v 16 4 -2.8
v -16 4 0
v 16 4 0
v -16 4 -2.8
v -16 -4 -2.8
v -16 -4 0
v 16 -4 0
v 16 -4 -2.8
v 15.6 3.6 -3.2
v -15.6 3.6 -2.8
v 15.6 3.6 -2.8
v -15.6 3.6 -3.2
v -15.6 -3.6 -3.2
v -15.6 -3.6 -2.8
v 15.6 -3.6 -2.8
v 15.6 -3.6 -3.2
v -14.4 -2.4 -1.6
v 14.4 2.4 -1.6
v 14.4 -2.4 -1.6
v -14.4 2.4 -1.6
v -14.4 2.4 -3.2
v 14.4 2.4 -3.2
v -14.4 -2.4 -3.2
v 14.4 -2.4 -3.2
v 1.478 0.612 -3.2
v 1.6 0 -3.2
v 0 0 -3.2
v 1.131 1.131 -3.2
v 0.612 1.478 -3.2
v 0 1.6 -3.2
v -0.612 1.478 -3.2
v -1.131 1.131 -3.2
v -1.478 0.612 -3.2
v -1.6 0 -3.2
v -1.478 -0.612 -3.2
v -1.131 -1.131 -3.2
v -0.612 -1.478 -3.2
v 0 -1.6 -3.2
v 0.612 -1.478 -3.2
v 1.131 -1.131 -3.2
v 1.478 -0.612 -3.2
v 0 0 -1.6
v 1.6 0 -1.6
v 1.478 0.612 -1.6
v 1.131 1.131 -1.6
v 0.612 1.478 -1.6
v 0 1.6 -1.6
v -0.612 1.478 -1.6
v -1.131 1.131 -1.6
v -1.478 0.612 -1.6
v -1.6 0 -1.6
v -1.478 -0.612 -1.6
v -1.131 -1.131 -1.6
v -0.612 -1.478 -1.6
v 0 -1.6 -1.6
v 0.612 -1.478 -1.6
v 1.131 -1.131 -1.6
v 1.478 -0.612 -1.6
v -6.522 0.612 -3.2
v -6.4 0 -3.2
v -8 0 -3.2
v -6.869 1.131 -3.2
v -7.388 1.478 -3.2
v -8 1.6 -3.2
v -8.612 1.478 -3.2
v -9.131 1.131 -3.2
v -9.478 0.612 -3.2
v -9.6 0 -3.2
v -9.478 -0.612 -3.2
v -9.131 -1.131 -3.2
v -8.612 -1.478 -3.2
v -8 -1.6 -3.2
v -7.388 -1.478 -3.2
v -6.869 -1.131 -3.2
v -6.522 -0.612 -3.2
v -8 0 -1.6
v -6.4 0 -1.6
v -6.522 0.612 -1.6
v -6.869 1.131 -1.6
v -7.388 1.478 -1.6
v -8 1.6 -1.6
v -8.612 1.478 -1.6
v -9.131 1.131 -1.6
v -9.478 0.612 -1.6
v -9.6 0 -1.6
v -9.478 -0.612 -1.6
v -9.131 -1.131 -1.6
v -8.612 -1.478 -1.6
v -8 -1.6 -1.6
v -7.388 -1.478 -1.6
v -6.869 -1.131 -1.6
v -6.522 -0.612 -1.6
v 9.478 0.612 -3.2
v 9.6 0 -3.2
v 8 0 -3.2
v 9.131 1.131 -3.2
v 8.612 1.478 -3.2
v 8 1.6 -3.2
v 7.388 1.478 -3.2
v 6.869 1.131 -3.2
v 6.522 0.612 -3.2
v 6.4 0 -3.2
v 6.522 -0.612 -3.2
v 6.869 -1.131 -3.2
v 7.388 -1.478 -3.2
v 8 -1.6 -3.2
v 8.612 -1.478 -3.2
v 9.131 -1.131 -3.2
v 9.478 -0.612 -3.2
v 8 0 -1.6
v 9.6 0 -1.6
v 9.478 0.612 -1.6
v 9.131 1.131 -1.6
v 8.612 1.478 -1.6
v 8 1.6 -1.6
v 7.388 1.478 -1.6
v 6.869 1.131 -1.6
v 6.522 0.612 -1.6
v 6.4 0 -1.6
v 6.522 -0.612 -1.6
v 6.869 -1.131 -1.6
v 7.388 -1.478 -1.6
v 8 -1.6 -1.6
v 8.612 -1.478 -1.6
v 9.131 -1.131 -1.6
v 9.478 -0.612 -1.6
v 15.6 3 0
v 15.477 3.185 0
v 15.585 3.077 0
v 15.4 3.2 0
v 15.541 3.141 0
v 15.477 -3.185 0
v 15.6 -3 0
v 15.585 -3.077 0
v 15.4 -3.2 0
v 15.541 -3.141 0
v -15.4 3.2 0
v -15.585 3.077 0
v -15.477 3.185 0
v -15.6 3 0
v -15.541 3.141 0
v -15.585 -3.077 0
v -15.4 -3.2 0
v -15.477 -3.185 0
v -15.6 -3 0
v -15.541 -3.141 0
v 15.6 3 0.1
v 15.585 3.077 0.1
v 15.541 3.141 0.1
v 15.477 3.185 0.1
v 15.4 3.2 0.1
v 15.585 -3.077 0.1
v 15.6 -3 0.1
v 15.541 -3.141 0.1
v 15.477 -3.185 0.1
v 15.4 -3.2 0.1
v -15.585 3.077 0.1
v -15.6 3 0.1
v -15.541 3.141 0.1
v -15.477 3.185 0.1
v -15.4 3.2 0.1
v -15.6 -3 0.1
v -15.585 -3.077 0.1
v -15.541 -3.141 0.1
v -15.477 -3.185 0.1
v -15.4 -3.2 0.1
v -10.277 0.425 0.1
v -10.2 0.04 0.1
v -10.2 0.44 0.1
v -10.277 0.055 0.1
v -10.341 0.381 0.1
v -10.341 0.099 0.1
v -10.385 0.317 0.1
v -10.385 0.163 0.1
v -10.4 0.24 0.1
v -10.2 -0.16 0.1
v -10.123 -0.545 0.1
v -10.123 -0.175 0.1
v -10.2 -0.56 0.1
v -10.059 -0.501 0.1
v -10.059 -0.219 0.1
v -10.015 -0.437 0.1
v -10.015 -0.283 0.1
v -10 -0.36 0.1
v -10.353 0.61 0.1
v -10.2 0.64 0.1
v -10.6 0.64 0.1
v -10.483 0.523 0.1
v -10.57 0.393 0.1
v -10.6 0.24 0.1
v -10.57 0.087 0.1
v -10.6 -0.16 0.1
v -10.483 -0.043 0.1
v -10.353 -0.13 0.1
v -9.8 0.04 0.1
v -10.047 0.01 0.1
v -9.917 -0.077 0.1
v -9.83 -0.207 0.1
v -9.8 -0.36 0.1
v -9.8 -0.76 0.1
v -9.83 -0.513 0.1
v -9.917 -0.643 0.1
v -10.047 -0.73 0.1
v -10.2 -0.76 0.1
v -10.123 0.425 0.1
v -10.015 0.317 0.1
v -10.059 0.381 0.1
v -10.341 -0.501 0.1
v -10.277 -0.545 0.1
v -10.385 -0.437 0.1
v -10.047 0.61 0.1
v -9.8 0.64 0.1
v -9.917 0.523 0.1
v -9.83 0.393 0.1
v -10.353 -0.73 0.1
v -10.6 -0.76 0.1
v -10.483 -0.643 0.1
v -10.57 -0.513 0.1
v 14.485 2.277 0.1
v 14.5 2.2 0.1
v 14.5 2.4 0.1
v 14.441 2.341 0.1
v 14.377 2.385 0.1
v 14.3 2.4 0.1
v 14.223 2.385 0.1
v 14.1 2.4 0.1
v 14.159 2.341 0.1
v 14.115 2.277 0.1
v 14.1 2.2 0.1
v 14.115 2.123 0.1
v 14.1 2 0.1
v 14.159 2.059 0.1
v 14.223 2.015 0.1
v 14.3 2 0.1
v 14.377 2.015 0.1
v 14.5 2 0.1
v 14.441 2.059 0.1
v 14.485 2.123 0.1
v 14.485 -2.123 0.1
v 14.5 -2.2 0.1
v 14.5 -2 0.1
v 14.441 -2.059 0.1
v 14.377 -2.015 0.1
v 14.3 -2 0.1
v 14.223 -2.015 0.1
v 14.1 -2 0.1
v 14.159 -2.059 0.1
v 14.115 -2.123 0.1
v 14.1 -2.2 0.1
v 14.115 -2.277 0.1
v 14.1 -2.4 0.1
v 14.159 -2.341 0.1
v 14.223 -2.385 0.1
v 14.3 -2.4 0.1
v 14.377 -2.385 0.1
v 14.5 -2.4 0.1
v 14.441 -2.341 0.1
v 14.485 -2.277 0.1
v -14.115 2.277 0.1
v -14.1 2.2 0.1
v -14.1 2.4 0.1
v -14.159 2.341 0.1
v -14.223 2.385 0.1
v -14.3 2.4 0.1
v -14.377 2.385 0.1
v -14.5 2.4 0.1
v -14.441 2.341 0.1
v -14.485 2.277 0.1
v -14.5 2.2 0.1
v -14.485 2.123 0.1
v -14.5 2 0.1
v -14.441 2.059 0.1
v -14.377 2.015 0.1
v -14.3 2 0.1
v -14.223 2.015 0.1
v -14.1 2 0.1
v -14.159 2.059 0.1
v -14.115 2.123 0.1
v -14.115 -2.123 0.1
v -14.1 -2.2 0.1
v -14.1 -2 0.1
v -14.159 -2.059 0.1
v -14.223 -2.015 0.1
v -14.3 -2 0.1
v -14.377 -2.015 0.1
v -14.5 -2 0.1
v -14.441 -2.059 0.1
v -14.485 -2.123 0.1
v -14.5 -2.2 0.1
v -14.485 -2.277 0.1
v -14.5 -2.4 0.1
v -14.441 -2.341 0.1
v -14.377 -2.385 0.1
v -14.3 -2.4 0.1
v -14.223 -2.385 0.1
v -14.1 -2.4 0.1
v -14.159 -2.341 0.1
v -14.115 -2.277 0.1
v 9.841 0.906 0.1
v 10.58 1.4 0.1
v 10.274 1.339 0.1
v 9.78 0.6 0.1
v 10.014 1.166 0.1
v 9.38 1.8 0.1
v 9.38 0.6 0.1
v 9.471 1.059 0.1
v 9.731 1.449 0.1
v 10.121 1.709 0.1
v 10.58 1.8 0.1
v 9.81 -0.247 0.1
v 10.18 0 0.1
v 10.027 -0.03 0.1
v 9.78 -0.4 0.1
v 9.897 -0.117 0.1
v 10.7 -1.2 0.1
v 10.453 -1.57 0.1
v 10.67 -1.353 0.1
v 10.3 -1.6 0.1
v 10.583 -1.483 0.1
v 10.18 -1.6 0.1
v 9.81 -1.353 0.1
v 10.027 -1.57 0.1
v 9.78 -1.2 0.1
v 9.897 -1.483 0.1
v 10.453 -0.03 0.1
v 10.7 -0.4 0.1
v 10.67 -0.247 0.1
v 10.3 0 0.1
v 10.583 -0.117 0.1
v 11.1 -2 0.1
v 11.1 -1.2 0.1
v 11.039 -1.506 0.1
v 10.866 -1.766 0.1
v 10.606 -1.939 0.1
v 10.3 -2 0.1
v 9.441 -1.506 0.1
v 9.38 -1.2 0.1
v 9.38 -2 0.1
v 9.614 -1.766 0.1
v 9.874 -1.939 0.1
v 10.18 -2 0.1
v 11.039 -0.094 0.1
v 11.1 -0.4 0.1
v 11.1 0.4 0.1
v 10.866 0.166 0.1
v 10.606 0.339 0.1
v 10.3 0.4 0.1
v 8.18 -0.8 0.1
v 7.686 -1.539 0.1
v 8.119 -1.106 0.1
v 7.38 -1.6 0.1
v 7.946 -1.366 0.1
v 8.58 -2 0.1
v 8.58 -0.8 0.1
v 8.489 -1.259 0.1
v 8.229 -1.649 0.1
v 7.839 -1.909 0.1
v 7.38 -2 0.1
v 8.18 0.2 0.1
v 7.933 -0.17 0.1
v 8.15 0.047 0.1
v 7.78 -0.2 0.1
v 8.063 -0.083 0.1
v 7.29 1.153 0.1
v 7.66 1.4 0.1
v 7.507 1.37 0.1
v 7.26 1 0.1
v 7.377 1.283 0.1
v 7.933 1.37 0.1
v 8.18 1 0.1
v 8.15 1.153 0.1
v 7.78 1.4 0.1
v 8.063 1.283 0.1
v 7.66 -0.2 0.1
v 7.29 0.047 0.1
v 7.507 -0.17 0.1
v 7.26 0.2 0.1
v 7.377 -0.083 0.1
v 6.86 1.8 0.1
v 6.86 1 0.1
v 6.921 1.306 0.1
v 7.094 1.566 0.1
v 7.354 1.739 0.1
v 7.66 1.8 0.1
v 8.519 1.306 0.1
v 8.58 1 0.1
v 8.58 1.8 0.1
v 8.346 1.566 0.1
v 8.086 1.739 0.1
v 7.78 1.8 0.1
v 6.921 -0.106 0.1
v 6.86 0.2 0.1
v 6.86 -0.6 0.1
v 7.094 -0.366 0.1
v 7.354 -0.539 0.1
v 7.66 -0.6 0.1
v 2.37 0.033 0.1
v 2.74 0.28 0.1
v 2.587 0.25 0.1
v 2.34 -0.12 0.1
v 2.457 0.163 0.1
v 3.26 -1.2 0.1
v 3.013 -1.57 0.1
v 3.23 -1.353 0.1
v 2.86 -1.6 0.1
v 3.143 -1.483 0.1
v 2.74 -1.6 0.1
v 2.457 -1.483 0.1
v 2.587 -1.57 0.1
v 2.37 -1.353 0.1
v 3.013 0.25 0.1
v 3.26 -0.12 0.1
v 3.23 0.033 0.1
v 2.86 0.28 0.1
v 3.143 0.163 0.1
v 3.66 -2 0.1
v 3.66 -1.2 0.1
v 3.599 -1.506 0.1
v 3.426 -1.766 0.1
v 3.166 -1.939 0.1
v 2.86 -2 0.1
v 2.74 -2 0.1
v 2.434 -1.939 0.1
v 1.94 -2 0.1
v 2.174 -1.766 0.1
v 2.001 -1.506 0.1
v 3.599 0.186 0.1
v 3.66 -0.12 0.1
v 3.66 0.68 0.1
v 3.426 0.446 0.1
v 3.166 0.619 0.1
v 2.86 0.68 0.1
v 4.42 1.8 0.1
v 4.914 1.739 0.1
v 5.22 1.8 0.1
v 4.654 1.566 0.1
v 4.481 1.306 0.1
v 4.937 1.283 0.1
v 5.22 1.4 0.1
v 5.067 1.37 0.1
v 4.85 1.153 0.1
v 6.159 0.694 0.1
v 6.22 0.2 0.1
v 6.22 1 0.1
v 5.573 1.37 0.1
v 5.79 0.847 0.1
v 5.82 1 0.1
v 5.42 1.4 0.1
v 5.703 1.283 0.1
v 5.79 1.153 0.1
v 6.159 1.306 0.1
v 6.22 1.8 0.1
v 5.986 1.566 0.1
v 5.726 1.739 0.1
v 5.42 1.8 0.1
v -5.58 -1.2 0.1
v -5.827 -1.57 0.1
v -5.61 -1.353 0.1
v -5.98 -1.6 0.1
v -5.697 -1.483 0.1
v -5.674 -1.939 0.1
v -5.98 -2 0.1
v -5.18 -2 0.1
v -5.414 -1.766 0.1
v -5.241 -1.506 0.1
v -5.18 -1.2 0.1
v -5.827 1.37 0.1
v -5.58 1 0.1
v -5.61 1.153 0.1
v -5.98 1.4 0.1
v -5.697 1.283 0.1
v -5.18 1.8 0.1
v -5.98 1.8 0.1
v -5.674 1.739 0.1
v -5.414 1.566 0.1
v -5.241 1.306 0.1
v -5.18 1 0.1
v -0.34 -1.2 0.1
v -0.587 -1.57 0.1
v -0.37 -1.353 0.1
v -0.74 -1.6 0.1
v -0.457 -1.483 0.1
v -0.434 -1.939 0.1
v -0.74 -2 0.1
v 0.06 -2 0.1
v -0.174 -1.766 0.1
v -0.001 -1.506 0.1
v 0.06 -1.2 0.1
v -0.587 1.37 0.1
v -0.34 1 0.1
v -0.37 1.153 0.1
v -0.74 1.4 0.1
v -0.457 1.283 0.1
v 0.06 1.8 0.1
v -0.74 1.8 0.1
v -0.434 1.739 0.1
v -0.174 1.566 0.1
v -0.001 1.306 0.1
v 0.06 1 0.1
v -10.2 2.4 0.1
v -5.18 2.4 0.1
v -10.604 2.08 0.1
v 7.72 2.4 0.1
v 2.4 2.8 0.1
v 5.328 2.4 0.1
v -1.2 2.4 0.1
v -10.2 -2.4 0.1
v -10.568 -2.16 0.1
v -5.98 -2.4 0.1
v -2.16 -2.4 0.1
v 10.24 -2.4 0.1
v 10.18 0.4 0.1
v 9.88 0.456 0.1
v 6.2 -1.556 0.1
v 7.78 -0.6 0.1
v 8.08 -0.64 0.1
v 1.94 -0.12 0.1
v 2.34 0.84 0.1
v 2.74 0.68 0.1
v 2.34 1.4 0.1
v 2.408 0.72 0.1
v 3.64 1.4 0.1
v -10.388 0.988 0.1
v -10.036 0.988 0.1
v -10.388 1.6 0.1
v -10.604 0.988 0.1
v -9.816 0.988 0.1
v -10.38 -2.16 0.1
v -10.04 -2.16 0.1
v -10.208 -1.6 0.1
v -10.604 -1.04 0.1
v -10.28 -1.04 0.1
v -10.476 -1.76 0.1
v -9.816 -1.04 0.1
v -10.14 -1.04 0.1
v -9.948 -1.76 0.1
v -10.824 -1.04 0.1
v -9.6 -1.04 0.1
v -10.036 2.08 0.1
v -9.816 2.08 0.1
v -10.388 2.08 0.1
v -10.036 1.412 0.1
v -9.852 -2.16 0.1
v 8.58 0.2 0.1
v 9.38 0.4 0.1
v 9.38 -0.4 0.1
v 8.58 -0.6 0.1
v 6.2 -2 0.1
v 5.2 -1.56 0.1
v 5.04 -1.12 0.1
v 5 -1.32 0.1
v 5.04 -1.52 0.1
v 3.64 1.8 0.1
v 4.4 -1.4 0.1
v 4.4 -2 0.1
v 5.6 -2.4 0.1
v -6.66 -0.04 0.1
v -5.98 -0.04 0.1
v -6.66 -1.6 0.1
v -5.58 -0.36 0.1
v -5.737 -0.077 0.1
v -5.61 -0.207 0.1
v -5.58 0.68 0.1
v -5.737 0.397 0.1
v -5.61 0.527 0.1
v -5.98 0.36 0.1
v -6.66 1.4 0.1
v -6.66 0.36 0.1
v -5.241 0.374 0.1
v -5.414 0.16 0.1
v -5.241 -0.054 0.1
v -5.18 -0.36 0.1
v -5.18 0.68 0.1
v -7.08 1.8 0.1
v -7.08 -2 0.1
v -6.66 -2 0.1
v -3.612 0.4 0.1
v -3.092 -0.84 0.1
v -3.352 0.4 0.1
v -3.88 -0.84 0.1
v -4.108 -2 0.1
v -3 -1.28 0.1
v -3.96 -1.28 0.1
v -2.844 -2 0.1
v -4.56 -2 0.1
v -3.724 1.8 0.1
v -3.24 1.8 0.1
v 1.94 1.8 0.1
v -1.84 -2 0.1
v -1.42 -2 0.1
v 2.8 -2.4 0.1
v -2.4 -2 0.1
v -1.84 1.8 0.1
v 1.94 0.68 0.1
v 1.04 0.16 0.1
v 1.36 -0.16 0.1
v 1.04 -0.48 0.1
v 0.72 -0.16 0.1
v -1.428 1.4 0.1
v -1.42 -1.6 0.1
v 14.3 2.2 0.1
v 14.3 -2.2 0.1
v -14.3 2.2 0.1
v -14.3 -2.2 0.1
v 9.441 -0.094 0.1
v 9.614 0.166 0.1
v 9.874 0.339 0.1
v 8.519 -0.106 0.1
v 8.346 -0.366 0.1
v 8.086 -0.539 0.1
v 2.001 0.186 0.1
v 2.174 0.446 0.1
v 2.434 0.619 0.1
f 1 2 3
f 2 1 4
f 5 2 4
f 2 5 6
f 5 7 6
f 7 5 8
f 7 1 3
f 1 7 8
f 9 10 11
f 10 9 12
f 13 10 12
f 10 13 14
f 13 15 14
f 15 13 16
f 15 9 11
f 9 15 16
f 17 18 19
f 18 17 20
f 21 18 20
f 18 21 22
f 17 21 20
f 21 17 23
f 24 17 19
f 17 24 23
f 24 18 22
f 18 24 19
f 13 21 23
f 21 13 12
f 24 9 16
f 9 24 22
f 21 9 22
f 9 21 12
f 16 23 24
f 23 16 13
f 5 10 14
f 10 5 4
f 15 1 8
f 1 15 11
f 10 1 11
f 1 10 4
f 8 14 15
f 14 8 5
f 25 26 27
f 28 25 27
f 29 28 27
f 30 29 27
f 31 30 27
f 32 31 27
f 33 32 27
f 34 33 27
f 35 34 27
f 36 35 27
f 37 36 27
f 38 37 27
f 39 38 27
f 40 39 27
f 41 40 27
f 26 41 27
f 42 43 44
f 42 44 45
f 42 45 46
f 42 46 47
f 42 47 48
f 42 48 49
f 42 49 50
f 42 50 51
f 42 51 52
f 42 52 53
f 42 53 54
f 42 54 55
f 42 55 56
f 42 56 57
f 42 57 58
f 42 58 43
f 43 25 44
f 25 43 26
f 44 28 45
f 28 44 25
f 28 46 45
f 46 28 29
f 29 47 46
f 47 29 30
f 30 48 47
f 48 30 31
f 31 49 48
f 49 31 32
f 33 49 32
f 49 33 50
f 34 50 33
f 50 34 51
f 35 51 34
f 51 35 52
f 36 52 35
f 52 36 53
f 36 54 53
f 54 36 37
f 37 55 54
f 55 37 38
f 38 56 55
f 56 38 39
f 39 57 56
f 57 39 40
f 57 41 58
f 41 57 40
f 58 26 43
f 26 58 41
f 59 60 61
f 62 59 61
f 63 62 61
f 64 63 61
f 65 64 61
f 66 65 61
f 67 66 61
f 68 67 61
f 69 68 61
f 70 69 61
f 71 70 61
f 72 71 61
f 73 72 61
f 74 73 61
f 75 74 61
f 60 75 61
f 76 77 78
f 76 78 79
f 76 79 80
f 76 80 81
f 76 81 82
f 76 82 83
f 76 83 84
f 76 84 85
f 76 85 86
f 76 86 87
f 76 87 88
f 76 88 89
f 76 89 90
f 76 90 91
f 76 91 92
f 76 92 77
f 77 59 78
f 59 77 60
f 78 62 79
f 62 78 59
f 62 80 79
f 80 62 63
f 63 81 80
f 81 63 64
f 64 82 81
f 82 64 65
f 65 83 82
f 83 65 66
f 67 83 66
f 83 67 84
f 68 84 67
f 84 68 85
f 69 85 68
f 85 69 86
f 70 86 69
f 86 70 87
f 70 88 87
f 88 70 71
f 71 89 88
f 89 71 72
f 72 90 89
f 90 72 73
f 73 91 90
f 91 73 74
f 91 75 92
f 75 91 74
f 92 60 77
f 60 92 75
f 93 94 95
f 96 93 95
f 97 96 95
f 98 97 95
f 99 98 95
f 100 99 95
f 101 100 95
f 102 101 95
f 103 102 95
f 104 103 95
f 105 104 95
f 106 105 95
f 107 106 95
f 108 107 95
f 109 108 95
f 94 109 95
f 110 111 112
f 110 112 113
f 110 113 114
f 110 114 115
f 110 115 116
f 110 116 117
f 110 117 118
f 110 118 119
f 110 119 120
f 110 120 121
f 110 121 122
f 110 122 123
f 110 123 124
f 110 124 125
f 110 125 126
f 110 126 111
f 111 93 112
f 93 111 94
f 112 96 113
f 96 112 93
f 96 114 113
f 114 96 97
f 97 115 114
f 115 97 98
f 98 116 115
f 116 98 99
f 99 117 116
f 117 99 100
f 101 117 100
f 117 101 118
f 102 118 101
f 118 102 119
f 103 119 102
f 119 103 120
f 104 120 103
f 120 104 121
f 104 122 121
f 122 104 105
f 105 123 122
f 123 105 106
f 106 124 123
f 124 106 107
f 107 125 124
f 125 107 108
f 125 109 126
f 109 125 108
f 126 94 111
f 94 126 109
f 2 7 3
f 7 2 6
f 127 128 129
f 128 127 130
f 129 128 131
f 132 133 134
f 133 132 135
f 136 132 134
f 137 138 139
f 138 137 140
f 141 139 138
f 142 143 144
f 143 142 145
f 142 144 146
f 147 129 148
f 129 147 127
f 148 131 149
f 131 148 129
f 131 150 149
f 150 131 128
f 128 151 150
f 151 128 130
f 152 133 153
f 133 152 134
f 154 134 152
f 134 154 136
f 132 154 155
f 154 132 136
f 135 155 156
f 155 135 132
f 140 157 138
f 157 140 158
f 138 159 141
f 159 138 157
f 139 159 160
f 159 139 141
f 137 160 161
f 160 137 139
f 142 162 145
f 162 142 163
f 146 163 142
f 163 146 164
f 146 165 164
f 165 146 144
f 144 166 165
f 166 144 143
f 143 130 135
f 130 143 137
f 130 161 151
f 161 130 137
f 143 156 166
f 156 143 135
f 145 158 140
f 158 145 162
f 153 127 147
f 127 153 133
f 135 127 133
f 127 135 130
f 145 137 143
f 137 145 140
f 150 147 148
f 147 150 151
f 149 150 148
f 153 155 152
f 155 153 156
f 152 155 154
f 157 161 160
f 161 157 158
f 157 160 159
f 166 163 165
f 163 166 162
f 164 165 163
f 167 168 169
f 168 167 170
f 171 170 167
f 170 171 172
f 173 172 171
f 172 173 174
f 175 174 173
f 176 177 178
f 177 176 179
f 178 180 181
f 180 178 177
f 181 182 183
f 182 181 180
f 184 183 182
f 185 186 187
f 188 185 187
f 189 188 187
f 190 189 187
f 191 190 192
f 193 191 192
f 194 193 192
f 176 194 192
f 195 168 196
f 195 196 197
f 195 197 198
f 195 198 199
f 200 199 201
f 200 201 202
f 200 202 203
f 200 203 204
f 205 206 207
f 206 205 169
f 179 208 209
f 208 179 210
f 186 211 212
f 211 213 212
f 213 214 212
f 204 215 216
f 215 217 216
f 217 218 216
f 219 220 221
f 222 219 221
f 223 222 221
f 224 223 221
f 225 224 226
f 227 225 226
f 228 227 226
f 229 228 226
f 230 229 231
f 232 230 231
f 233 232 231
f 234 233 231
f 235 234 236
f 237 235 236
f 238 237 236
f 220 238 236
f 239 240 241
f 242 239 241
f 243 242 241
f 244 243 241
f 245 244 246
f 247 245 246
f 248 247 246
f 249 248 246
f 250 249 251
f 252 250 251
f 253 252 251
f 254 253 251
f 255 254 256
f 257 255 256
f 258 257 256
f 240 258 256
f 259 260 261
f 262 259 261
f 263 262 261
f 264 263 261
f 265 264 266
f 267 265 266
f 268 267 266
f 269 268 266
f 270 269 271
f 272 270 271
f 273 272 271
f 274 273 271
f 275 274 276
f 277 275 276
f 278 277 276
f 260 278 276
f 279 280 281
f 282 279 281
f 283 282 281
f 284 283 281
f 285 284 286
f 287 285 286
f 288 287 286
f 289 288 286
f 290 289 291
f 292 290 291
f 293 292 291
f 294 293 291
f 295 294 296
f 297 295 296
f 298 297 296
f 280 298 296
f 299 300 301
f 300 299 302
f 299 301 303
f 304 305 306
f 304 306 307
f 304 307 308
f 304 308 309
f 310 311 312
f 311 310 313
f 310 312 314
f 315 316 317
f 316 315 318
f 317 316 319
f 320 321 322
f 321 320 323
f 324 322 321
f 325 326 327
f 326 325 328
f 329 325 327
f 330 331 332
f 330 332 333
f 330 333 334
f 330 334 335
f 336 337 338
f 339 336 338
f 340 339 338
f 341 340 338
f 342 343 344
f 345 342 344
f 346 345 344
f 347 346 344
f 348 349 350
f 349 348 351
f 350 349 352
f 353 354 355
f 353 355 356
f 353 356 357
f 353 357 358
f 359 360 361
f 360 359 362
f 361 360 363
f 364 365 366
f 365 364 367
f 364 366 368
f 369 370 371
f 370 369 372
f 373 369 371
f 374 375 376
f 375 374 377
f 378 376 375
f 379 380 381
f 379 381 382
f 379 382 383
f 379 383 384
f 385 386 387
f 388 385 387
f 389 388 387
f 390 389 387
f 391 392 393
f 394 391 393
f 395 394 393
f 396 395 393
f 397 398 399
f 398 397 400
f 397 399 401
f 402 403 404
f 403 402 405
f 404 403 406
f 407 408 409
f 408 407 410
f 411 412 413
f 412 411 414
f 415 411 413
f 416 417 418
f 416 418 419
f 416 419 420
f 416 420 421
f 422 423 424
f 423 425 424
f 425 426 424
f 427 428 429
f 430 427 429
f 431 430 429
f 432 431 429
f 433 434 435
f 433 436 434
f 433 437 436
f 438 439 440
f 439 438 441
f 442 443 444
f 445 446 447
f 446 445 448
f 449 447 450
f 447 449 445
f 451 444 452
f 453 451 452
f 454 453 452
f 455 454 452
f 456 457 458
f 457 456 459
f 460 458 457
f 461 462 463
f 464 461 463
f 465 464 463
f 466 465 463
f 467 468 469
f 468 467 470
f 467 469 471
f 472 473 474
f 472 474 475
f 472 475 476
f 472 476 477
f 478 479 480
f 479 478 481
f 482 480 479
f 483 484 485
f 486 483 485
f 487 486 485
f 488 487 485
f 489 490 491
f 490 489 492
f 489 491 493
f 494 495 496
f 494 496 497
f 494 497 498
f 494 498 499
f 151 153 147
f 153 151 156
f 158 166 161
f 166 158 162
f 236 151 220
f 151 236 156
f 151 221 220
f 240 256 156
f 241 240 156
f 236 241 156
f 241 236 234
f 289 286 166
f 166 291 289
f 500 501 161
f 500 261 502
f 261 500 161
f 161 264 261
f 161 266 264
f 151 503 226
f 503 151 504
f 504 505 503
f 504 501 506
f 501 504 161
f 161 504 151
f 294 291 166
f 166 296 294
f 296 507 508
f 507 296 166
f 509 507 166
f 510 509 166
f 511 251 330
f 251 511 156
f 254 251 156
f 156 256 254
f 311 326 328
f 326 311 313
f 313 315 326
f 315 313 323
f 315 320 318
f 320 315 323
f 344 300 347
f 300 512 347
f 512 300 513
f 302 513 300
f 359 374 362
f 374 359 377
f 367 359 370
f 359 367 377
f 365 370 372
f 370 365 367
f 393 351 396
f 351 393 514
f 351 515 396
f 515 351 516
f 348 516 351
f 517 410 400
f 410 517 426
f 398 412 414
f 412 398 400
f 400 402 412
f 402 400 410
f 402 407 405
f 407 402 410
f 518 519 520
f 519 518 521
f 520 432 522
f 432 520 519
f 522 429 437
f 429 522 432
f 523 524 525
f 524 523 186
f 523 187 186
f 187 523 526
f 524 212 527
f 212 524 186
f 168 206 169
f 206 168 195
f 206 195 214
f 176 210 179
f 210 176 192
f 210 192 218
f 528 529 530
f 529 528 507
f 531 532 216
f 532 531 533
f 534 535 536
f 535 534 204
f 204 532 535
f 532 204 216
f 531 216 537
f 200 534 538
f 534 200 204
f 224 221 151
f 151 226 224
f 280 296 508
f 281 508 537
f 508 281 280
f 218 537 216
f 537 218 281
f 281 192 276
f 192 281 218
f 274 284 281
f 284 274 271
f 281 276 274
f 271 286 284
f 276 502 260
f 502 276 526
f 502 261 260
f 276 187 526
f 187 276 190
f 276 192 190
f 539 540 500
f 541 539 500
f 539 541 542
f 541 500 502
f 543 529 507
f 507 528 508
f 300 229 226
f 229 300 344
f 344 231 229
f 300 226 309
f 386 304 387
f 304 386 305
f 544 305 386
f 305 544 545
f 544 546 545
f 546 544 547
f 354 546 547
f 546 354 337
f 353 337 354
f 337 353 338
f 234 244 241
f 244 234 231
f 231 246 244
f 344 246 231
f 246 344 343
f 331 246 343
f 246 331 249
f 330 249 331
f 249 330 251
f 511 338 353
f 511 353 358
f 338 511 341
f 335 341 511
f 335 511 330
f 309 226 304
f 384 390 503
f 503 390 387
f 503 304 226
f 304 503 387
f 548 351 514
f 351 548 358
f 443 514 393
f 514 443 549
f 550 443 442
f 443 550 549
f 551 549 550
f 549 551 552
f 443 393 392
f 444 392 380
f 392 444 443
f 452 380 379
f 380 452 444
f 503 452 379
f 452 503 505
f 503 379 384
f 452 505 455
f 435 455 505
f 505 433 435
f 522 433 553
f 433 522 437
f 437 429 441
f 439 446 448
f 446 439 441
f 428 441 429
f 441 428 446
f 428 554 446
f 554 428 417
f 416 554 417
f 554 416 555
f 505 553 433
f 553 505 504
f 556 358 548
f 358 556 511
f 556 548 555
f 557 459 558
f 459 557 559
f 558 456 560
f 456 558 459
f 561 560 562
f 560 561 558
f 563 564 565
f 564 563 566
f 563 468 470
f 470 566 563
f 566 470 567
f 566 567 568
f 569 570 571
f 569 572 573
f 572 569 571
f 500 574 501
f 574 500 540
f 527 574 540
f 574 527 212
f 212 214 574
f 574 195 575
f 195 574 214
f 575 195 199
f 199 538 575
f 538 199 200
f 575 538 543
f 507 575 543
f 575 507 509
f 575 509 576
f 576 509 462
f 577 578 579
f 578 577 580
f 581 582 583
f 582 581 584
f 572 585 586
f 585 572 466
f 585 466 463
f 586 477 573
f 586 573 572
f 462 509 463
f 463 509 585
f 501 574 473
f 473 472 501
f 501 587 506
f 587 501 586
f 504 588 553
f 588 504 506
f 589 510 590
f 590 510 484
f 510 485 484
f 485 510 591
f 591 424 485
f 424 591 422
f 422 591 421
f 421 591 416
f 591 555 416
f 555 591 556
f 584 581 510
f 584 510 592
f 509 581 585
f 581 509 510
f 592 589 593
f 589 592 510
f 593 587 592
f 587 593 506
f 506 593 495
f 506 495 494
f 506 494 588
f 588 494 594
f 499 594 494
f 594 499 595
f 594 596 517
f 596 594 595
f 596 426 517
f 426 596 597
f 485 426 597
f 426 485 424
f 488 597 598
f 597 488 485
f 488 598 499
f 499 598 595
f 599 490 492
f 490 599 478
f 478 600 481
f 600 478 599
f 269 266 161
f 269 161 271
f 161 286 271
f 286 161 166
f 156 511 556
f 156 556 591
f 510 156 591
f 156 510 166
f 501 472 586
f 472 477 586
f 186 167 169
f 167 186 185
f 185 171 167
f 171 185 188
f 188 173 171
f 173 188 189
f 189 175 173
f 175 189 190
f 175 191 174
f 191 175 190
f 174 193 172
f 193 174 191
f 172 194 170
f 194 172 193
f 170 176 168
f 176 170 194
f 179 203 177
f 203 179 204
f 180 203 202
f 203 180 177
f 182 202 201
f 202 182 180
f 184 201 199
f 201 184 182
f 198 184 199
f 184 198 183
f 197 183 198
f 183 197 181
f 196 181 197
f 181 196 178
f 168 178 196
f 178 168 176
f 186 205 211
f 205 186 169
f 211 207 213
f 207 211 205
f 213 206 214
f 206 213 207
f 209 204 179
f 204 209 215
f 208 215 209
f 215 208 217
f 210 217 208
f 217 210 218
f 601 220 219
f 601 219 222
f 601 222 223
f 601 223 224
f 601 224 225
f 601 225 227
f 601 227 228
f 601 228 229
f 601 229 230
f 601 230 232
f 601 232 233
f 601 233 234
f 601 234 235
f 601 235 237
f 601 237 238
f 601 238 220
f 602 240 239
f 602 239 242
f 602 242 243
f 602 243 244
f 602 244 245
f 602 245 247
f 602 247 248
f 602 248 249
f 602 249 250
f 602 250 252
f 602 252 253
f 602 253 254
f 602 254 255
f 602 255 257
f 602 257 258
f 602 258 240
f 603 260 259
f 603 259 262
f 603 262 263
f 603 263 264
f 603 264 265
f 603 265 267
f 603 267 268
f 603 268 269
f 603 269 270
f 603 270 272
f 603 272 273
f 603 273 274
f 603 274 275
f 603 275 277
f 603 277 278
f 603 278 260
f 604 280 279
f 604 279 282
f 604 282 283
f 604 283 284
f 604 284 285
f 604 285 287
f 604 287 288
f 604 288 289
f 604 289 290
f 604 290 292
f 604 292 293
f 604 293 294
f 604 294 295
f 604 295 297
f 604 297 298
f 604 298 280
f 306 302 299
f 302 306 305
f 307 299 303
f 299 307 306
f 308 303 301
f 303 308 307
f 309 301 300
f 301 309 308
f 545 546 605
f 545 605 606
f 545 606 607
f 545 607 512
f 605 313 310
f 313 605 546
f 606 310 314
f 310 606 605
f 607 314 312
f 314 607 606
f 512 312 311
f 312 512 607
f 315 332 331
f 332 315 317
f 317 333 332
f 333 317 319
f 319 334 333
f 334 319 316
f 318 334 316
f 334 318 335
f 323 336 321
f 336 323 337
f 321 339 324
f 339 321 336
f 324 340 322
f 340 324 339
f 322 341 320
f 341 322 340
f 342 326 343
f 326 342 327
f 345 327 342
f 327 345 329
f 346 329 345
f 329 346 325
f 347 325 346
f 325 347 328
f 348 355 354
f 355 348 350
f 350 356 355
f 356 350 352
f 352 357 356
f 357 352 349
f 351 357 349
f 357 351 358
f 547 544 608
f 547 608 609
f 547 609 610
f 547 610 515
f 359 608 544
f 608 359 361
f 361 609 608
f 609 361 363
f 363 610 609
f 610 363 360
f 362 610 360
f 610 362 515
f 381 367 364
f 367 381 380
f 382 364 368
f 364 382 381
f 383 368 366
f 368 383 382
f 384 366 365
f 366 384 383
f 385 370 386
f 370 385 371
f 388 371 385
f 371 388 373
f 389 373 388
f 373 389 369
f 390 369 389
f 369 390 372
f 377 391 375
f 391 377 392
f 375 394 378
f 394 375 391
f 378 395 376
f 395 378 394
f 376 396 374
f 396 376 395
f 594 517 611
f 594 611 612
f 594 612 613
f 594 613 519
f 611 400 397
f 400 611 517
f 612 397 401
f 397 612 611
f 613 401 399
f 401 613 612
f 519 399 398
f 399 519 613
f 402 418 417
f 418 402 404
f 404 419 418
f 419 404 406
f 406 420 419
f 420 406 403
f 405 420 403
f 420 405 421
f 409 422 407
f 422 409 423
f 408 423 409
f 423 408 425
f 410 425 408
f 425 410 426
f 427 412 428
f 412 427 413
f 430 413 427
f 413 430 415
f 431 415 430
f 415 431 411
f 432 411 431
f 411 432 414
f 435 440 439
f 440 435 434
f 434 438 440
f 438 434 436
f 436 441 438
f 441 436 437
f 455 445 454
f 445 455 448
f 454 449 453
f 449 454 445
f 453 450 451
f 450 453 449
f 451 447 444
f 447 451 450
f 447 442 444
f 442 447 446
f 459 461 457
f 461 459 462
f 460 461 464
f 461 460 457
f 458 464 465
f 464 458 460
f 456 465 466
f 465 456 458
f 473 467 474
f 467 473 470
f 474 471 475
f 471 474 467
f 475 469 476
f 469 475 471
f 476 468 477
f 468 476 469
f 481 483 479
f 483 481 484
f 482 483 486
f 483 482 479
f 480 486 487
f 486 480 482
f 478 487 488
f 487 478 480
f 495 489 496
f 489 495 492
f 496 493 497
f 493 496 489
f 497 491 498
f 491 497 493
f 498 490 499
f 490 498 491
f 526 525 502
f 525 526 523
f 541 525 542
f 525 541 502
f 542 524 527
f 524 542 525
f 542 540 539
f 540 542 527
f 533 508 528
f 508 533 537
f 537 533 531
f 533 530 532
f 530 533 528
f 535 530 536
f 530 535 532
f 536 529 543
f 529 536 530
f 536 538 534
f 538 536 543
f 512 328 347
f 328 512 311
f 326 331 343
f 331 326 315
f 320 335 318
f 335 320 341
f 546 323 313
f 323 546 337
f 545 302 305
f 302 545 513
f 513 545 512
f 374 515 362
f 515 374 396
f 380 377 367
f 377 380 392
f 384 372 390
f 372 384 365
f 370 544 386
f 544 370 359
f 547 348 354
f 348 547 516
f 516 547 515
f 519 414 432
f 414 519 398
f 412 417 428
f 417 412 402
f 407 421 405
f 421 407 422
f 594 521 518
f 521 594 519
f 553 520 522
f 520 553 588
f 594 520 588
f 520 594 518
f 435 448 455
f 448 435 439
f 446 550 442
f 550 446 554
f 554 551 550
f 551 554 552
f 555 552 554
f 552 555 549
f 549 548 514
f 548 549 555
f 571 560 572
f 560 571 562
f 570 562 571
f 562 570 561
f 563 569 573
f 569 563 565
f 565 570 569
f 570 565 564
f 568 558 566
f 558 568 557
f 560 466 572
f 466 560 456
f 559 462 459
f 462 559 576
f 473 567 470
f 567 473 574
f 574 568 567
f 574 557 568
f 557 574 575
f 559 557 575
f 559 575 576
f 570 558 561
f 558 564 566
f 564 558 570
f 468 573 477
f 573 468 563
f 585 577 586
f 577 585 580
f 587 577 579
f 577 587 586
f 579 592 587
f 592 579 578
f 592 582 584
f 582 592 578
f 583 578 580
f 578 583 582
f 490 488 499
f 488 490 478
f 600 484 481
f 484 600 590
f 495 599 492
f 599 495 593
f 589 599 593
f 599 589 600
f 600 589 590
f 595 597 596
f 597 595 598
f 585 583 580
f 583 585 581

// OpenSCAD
use <../lib.scad>
use <2431.scad>
use <6258203g.scad>
function ldraw_lib__2431dt1() = [
// 0 Tile  1 x  4 with  White Australian License Plate "NSW BAD 5296" Sticker
// 0 Name: 2431dt1.dat
// 0 Author: Ulrich Röder [UR]
// 0 !LDRAW_ORG Shortcut UPDATE 2024-04
// 0 !LICENSE Licensed under CC BY 4.0 : see CAreadme.txt
// 
// 0 BFC CERTIFY CCW
  [0,"BFC","CERTIFY"],
  [0,"BFC","CCW"],
// 
// 0 !CATEGORY Sticker Shortcut
// 0 !KEYWORDS Ford, Mustang, Set 10265
// 
// 0 !HISTORY 2019-06-28 [PTadmin] Official Update 2019-01
// 0 !HISTORY 2024-05-27 [OrionP] Change category to Sticker Shortcut
// 0 !HISTORY 2024-05-28 [OrionP] Official Update 2024-04
// 
// 
// 1 16 0 0 0 1 0 0 0 1 0 0 0 1 2431.dat
  [1,16,0,0,0,1,0,0,0,1,0,0,0,1, ldraw_lib__2431()],
// 1 16 0 0 0 1 0 0 0 1 0 0 0 1 6258203g.dat
  [1,16,0,0,0,1,0,0,0,1,0,0,0,1, ldraw_lib__6258203g()],
];
module ldraw_lib__2431dt1(step=0, col=false, unit=2/5, alt=false, line=0.2, solid=!$preview)
    makepoly(ldraw_lib__2431dt1(), step=step, col=col, unit=unit, alt=alt, line=line, solid=solid);
ldraw_lib__2431dt1(line=0.2);
